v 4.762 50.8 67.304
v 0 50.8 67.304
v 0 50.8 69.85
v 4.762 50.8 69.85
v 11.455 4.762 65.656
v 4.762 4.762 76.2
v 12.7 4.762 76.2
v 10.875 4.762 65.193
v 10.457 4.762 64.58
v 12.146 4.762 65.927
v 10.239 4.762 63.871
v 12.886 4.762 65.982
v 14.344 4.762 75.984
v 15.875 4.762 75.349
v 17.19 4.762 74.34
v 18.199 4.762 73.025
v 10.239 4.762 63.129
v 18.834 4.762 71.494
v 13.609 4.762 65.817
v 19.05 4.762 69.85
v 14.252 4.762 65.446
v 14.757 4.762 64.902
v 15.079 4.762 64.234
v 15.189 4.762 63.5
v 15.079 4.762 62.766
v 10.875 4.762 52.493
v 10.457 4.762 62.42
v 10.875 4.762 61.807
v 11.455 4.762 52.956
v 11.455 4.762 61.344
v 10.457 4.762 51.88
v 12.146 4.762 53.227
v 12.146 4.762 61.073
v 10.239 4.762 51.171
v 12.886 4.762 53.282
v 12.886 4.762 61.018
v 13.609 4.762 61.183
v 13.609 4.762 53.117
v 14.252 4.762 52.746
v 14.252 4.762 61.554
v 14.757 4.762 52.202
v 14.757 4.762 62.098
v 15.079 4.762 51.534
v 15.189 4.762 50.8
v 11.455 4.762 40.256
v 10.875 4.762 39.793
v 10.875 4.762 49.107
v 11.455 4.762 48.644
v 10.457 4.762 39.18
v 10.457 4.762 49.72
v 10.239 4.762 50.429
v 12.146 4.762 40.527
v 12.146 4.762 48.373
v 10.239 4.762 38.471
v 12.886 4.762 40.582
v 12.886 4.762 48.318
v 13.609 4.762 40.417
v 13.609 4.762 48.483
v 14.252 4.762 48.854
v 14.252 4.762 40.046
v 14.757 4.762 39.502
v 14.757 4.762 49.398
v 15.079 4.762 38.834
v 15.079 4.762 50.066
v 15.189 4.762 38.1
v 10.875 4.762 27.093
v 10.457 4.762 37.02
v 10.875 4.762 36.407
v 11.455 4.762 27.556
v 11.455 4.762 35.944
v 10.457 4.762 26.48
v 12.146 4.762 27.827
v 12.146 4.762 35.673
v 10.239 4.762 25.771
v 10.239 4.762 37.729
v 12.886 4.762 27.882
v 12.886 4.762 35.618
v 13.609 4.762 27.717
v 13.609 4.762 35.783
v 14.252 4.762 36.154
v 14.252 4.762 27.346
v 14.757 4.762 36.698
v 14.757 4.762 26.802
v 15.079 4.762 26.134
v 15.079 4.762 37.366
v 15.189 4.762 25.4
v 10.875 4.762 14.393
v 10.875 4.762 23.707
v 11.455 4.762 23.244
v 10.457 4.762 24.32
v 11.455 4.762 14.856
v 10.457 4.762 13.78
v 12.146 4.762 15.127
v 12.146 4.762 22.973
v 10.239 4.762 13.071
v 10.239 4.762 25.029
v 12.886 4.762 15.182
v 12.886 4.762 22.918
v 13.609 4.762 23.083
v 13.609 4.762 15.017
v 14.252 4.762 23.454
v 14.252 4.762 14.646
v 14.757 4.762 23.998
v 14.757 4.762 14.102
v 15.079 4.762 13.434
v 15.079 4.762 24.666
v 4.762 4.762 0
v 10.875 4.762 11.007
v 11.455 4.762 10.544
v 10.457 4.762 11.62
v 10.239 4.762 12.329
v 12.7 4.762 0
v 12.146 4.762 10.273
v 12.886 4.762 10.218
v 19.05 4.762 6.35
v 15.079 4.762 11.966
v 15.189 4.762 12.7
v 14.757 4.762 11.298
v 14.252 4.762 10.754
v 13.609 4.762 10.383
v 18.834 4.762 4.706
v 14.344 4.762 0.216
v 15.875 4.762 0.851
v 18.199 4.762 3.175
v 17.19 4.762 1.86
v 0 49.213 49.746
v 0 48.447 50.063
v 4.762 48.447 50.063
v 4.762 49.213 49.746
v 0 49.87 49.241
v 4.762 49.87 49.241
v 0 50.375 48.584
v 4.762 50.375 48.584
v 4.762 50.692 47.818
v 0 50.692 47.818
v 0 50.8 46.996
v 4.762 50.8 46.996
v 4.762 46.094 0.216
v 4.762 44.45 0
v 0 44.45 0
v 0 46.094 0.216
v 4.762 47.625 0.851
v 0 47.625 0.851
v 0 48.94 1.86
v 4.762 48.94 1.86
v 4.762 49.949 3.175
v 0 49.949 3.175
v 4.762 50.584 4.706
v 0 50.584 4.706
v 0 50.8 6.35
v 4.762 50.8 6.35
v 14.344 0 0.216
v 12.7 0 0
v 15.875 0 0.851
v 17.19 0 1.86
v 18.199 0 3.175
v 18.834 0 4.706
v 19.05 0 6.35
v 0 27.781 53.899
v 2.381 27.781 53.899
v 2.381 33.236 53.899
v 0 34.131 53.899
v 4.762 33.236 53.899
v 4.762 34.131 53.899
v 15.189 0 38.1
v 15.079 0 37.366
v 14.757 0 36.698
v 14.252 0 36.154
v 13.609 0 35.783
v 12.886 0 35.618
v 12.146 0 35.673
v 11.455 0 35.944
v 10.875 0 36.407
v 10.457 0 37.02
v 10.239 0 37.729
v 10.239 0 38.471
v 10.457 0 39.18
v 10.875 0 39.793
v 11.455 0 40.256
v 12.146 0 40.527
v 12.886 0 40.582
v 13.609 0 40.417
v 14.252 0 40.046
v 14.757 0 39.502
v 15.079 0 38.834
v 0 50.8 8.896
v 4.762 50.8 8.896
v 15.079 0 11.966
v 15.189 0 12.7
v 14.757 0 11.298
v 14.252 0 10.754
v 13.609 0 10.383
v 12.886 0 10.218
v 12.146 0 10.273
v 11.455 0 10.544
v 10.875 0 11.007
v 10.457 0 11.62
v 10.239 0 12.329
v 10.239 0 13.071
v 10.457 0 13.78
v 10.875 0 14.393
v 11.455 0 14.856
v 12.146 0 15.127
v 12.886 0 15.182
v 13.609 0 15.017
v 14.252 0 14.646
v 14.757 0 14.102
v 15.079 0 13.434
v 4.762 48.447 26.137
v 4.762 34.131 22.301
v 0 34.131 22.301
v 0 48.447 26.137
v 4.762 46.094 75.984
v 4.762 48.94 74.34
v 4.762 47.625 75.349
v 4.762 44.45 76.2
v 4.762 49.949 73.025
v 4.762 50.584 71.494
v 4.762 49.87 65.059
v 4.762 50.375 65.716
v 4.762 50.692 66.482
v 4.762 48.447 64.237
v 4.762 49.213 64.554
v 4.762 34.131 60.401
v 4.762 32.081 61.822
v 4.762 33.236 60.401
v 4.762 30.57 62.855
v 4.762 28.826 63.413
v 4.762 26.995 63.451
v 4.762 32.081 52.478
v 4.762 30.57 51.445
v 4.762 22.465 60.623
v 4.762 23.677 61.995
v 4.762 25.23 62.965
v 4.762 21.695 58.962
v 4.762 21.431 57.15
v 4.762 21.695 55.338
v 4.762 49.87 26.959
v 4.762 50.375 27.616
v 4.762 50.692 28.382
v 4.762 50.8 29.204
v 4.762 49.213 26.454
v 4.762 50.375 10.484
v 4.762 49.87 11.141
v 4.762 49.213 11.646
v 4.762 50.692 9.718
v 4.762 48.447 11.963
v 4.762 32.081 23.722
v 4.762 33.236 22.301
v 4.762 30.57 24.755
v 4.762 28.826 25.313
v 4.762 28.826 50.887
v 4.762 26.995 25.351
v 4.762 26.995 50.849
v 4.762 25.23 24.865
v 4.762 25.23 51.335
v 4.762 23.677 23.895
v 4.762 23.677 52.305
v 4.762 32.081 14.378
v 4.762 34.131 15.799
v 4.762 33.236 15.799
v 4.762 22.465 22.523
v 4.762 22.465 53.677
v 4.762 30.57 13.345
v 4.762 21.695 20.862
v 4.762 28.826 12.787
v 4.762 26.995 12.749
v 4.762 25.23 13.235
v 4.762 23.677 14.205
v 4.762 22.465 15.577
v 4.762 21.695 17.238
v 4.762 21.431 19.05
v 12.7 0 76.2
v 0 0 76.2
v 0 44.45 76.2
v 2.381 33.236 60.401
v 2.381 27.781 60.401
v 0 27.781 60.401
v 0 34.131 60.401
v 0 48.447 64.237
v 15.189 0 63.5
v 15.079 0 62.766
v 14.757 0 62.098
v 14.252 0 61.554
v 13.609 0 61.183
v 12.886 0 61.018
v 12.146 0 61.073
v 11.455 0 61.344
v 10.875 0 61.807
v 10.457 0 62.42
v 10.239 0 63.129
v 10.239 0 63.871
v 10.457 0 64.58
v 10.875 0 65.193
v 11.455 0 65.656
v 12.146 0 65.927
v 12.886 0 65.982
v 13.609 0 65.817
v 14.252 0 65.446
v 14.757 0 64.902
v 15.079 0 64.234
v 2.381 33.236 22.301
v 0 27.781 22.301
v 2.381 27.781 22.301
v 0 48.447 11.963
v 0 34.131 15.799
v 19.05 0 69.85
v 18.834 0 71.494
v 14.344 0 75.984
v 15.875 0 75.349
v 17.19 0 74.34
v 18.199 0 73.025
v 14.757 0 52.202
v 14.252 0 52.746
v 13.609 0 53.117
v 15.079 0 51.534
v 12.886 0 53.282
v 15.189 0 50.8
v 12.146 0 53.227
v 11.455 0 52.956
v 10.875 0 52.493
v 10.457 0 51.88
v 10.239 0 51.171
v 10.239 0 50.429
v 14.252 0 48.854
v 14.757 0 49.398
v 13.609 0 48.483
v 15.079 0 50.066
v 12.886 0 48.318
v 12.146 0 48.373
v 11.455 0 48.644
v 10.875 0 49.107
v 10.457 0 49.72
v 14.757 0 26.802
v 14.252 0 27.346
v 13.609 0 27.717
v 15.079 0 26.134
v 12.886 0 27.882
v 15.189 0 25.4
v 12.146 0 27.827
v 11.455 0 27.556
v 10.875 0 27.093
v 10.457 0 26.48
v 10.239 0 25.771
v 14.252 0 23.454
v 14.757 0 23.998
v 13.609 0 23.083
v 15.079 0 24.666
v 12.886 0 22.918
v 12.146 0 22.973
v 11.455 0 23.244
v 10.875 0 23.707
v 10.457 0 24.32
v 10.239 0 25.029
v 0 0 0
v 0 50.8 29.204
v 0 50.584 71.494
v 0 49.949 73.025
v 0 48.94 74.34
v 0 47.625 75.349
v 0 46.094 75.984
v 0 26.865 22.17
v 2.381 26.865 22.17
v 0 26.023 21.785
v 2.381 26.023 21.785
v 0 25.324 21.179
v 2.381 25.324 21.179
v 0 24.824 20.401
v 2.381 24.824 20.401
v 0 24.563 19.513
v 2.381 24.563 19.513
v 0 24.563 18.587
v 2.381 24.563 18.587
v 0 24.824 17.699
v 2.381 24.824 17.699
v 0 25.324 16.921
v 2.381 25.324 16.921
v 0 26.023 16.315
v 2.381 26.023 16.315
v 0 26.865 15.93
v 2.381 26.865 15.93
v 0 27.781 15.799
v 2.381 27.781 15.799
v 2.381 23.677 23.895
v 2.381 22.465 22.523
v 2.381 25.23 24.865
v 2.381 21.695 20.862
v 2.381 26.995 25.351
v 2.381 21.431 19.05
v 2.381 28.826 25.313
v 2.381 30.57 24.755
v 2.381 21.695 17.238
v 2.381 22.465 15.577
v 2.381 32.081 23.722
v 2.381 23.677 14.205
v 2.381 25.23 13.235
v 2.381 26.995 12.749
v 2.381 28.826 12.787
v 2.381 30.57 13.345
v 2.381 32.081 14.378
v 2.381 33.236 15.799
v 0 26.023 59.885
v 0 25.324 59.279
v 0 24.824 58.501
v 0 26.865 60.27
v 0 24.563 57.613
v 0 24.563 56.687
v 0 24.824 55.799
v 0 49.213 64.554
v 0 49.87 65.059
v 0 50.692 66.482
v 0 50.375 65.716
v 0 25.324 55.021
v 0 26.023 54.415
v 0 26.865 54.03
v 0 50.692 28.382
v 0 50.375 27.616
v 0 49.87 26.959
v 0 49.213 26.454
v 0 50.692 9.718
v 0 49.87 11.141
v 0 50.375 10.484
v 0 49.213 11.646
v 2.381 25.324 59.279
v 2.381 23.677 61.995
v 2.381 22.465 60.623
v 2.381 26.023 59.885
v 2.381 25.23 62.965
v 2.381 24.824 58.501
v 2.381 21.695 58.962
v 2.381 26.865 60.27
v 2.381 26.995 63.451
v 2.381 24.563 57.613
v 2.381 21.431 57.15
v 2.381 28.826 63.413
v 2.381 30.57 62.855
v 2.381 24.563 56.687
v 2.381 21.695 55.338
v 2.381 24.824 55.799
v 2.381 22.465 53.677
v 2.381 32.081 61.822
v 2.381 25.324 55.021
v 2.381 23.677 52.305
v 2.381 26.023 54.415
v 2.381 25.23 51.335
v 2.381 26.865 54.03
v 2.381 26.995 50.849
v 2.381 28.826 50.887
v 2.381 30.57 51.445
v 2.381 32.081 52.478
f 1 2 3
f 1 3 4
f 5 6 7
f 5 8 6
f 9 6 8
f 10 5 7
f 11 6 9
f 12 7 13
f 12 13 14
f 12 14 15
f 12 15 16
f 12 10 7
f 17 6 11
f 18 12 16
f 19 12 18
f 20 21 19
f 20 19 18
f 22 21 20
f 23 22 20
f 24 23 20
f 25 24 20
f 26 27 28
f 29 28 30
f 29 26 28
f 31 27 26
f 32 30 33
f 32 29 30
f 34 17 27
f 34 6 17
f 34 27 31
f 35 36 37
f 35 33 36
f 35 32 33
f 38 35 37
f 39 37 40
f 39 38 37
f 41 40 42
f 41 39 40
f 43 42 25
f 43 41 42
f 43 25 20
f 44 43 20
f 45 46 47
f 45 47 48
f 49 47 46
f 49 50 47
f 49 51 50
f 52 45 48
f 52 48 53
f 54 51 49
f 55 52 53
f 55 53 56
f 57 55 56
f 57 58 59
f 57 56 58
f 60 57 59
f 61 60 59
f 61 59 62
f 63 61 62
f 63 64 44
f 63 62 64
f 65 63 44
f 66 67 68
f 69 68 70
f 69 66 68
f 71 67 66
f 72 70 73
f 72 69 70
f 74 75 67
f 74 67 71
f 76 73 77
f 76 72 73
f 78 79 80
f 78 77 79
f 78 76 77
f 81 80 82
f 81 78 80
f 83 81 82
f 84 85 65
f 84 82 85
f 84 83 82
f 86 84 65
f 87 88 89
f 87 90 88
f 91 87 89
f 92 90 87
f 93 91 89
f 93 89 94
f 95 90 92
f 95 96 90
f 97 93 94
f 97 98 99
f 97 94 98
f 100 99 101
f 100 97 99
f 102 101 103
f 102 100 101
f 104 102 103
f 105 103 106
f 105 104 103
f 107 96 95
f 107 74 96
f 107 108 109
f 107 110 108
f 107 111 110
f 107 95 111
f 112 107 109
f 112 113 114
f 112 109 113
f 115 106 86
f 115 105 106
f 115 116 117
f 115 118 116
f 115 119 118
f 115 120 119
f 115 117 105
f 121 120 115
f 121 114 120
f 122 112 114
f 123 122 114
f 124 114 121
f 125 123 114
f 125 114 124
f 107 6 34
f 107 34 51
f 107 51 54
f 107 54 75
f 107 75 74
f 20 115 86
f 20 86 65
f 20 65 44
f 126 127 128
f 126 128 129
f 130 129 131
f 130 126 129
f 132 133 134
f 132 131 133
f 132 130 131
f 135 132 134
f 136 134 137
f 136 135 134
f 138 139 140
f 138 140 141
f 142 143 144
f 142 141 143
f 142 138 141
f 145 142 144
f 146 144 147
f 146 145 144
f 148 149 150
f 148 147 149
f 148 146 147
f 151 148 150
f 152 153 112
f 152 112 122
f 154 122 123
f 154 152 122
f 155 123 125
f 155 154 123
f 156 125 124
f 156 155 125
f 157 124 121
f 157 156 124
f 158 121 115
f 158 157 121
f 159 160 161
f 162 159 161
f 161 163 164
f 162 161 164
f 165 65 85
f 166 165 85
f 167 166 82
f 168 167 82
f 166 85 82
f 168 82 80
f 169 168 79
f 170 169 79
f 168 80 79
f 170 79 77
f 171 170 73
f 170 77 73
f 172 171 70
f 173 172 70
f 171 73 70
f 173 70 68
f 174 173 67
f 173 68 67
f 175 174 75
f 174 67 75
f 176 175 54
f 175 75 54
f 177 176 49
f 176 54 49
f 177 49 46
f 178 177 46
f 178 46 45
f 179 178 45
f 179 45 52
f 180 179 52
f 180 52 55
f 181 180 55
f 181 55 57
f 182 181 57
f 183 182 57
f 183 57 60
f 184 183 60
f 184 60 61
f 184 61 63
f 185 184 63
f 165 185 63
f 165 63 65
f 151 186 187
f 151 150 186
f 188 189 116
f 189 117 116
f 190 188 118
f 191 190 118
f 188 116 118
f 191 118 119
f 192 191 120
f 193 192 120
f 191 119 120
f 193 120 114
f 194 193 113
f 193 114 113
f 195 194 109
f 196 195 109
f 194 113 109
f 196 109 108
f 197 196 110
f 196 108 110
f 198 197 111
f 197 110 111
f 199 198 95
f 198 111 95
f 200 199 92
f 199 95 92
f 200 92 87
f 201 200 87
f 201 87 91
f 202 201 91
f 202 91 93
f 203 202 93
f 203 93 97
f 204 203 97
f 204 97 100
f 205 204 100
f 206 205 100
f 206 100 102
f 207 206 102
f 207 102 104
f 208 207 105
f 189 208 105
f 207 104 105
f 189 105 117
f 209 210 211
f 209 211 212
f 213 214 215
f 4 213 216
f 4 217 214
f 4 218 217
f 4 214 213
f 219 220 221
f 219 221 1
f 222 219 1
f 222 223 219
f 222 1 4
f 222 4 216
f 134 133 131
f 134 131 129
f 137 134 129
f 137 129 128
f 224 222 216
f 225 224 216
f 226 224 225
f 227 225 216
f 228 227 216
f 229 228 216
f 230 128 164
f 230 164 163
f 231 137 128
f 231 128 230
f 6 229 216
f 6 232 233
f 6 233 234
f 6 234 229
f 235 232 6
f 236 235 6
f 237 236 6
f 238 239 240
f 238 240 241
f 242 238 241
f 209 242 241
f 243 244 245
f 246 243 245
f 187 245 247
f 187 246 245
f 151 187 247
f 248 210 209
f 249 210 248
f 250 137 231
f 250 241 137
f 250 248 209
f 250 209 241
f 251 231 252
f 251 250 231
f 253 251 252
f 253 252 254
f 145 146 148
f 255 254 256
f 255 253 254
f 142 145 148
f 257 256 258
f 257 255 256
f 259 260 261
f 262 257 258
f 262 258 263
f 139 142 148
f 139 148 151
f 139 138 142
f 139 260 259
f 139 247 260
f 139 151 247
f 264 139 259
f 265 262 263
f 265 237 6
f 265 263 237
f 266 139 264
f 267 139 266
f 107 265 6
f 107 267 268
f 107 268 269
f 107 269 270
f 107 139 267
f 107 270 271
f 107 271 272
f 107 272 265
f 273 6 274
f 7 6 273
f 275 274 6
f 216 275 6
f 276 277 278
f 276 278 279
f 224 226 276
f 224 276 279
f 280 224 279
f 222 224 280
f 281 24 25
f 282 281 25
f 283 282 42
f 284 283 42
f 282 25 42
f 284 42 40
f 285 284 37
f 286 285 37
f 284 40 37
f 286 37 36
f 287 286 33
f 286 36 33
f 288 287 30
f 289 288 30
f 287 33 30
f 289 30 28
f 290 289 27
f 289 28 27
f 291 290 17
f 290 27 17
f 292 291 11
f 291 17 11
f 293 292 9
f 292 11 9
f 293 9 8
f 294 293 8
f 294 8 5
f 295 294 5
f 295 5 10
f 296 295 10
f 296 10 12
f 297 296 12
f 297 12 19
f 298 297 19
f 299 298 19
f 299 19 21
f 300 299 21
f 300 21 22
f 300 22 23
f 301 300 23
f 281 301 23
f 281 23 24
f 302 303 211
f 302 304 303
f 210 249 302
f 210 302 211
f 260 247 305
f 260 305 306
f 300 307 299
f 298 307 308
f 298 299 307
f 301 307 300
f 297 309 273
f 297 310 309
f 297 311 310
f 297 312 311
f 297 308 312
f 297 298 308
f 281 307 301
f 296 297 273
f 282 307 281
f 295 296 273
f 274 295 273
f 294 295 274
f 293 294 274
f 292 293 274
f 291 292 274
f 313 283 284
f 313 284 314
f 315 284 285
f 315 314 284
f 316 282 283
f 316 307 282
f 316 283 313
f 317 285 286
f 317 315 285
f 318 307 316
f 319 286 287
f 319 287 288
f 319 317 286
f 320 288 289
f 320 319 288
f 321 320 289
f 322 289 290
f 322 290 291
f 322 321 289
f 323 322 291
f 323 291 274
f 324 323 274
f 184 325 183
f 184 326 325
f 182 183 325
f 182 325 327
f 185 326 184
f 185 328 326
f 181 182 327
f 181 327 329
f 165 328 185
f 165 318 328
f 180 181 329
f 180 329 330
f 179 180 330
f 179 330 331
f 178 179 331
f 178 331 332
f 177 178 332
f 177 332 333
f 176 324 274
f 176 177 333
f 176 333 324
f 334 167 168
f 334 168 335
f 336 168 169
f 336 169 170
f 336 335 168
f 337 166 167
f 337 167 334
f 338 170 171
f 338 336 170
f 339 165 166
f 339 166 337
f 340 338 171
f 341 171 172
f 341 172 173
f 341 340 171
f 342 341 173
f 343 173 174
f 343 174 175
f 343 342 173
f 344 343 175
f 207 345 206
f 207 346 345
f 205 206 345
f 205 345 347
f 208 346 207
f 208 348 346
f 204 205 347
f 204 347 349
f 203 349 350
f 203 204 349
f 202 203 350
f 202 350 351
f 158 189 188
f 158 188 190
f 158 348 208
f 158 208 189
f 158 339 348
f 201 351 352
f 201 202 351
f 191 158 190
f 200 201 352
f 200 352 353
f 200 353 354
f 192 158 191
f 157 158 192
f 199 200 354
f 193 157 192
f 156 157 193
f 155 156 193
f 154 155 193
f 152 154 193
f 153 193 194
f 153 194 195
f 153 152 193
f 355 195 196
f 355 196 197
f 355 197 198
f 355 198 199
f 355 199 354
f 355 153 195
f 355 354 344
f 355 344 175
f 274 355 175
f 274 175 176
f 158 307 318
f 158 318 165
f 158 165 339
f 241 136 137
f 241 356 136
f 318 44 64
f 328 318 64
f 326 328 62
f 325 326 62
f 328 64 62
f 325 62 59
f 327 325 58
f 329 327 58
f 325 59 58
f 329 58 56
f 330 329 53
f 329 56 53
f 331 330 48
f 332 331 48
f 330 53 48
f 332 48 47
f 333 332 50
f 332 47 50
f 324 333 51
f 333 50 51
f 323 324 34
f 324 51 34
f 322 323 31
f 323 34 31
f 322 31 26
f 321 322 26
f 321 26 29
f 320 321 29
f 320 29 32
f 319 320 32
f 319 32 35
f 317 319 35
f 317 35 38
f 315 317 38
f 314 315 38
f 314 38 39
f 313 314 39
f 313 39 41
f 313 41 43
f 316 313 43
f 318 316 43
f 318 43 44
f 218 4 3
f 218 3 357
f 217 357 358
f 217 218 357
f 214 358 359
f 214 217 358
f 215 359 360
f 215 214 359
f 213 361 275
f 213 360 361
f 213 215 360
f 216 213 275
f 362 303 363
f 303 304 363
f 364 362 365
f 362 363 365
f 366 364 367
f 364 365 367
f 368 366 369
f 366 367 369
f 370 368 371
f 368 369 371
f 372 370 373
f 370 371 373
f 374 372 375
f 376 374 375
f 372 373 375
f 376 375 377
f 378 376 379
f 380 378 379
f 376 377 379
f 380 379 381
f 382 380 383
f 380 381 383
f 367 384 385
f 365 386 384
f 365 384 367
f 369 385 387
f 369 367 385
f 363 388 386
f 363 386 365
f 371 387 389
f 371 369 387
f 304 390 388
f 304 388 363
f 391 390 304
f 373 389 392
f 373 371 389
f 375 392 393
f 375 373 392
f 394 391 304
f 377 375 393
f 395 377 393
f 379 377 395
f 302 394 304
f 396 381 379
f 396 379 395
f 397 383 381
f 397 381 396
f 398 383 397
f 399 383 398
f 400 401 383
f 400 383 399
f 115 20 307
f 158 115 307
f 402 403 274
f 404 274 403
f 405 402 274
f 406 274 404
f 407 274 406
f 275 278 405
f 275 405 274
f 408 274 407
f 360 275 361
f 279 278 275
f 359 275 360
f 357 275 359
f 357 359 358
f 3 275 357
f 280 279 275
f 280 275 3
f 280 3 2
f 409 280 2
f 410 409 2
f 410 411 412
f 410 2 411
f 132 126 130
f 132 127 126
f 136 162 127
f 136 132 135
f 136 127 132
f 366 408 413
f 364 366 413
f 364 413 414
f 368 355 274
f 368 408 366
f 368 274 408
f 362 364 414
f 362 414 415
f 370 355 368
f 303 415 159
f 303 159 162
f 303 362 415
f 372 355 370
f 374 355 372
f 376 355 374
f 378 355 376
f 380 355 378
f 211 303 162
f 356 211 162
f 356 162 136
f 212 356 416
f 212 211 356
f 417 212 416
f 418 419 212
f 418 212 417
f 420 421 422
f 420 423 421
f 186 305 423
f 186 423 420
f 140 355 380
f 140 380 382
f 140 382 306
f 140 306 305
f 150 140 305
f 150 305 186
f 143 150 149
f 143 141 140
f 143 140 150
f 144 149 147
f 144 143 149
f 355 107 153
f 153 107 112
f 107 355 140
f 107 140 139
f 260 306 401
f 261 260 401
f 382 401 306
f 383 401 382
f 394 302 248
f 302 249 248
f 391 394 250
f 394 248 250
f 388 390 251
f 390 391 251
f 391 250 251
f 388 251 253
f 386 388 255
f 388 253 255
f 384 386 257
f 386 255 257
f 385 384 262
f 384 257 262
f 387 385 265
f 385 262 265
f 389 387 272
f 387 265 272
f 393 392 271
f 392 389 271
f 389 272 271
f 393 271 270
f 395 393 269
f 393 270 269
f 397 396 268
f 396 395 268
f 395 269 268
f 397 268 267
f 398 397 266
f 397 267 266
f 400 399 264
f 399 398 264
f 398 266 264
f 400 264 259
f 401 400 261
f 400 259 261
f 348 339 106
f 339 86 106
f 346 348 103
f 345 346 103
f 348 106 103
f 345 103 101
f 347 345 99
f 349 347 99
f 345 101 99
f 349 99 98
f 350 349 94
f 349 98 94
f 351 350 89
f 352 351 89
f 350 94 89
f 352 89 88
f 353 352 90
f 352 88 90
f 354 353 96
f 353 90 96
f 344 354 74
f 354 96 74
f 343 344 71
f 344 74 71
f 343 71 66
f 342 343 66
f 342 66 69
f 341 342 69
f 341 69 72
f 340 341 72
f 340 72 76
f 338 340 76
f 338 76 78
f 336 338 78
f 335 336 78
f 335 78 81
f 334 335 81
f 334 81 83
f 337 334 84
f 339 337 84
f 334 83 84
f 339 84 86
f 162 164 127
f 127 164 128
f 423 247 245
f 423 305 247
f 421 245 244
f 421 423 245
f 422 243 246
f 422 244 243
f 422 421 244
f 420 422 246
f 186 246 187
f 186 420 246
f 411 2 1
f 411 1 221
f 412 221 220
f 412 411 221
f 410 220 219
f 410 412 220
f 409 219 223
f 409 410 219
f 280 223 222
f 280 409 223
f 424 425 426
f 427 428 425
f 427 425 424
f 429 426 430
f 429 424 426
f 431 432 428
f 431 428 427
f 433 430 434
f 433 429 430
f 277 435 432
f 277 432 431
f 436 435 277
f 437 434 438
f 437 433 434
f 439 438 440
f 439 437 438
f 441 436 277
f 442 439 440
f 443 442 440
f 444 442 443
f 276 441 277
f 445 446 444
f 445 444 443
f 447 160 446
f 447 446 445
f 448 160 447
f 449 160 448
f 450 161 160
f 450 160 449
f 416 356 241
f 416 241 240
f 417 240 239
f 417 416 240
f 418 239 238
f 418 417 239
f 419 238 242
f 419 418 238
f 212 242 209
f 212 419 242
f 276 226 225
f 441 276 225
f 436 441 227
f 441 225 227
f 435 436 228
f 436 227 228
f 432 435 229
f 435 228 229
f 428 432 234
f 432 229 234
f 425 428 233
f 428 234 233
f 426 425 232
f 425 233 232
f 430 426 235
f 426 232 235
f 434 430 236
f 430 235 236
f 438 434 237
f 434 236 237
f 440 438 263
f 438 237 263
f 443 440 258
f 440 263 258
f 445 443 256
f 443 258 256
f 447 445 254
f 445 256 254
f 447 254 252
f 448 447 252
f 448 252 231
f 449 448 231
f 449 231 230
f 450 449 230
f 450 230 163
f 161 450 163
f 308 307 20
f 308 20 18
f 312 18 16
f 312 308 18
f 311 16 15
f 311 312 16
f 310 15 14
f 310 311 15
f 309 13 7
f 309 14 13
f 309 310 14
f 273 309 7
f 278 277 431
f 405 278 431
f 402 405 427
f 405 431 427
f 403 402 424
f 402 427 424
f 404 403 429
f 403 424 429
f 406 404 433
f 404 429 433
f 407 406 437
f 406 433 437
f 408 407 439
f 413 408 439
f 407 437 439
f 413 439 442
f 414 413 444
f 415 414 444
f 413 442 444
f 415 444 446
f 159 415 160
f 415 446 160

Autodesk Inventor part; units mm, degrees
ref_plane "YZ Plane" through (0, 0, 0) normal (1, 0, 0) x (0, 1, 0)
ref_plane "XZ Plane" through (0, 0, 0) normal (0, 1, 0) x (-1, 0, 0)
ref_plane "XY Plane" through (0, 0, 0) normal (0, 0, 1) x (1, 0, 0)
sketch "Sketch1" plane through (0, 0, 0) normal (0, 0, 1) x (1, 0, 0)
  line L0 (0, 0) -> (0, 50.8)
  line L1 (0, 50.8) -> (4.7625, 50.8)
  line L2 (4.7625, 50.8) -> (4.7625, 4.7625)
  line L3 (4.7625, 4.7625) -> (19.05, 4.7625)
  line L4 (19.05, 4.7625) -> (19.05, 0)
  line L5 (19.05, 0) -> (0, 0)
  dimension "d0" = 4.7625
  dimension "d1" = 19.05
  dimension "d2" = 50.8
  dimension "d3" = 4.7625
extrude "Extrusion1" add sketch "Sketch1" along normal blind 76.2
sketch "Sketch2" plane through (4.7625, 4.7625, 0) normal (1, 0, 0) x (0, 0, -1)
  circle A0 centre (-57.15, 23.0187) radius 3.2512
  circle A1 centre (-19.05, 23.0187) radius 3.2512
  line L0 (-76.2, 0) -> (-76.2, 46.0375) projected
  line L1 (0, 0) -> (0, 46.0375) projected
  line L2 (-60.4012, 23.0187) -> (-60.4012, 29.3687)
  line L3 (-60.4012, 29.3687) -> (-64.8676, 46.0375)
  line L4 (0, 46.0375) -> (-76.2, 46.0375) projected
  line L5 (-53.8988, 23.0187) -> (-53.8988, 29.3687)
  line L6 (-53.8988, 29.3687) -> (-49.4324, 46.0375)
  line L7 (-22.3012, 23.0187) -> (-22.3012, 29.3687)
  line L8 (-22.3012, 29.3687) -> (-26.7676, 46.0375)
  line L9 (-11.3324, 46.0375) -> (-15.7988, 29.3687)
  line L10 (-15.7988, 29.3687) -> (-15.7988, 23.0187)
  point P0 (0, -4.7625)
  point P1 (-76.2, 23.0187)
  point P2 (0, 23.0187)
  point P3 (-76.2, 23.0187)
  dimension "d6" = 6.5024
  dimension "d7" = 6.5024
  dimension "d8" = 19.05
  dimension "d9" = 38.1
  dimension "d10" = 19.05
  dimension "d11" = 6.35
  dimension "d12" = 165
extrude "Extrusion2" cut sketch "Sketch2" against normal blind 76.2
sketch "Sketch3" plane through (4.7625, 4.7625, 0) normal (1, 0, 0) x (0, 0, -1)
  arc A0 (-22.3012, 23.0187) -> (-15.7988, 23.0187) centre (-19.05, 23.0187) ccw projected
  circle A1 centre (-19.05, 23.0187) radius 6.35
  arc A2 (-60.4012, 23.0187) -> (-53.8988, 23.0187) centre (-57.15, 23.0187) ccw projected
  circle A3 centre (-57.15, 23.0187) radius 6.35
  point P0 (0, -4.7625)
  dimension "d15" = 12.7
  dimension "d16" = 12.7
extrude "Extrusion3" cut sketch "Sketch3" against normal blind 2.3813
fillet "Fillet1" radius 3.175 4 edges at (2.3813, 50.8, 64.8676) (2.3813, 50.8, 49.4324) (2.3813, 50.8, 26.7676) (2.3813, 50.8, 11.3324)
sketch "Sketch4" plane through (4.7625, 4.7625, 0) normal (0, 1, 0) x (1, 0, 0)
  circle A0 centre (7.9375, -63.5) radius 2.4892
  line L0 (14.2875, -76.2) -> (0, -76.2) projected
  line L1 (14.2875, 0) -> (14.2875, -76.2) projected
  circle A1 centre (7.9375, -50.8) radius 2.4892
  circle A2 centre (7.9375, -38.1) radius 2.4892
  circle A3 centre (7.9375, -25.4) radius 2.4892
  circle A4 centre (7.9375, -12.7) radius 2.4892
  circle A5 centre (7.9375, 0) radius 2.4892 construction
  line L2 (-4.7625, -67.3038) -> (-4.7625, -76.2) projected
  line L3 (-4.7625, -67.3038) -> (-4.7625, -64.237) projected
  line L4 (-4.7625, -60.4012) -> (-4.7625, -53.8988) projected
  line L5 (0, -64.237) -> (-4.7625, -64.237) projected
  line L6 (0, -60.4012) -> (0, -64.237) projected
  line L7 (0, -60.4012) -> (-4.7625, -60.4012) projected
  line L8 (-4.7625, -64.237) -> (-4.7625, -60.4012) projected
  point P0 (-4.7625, 0)
  point P1 (7.1437, -76.2)
  dimension "d20" = 4.9784
  dimension "d21" = 12.7
  dimension "d24" = 12.7
  dimension "d33" = 12.7
extrude "Extrusion4" cut sketch "Sketch4" against normal through all contours A0 | A1 | A2 | A3 | A4
fillet "Fillet2" radius 6.35 4 edges at (19.05, 2.3813, 76.2) (19.05, 2.3813, 0) (2.3813, 50.8, 76.2) (2.3813, 50.8, 0)
equation "\"d8\" = d10"
properties part number "BUMP_006_Bigbracket" material "Aluminum 6061"
